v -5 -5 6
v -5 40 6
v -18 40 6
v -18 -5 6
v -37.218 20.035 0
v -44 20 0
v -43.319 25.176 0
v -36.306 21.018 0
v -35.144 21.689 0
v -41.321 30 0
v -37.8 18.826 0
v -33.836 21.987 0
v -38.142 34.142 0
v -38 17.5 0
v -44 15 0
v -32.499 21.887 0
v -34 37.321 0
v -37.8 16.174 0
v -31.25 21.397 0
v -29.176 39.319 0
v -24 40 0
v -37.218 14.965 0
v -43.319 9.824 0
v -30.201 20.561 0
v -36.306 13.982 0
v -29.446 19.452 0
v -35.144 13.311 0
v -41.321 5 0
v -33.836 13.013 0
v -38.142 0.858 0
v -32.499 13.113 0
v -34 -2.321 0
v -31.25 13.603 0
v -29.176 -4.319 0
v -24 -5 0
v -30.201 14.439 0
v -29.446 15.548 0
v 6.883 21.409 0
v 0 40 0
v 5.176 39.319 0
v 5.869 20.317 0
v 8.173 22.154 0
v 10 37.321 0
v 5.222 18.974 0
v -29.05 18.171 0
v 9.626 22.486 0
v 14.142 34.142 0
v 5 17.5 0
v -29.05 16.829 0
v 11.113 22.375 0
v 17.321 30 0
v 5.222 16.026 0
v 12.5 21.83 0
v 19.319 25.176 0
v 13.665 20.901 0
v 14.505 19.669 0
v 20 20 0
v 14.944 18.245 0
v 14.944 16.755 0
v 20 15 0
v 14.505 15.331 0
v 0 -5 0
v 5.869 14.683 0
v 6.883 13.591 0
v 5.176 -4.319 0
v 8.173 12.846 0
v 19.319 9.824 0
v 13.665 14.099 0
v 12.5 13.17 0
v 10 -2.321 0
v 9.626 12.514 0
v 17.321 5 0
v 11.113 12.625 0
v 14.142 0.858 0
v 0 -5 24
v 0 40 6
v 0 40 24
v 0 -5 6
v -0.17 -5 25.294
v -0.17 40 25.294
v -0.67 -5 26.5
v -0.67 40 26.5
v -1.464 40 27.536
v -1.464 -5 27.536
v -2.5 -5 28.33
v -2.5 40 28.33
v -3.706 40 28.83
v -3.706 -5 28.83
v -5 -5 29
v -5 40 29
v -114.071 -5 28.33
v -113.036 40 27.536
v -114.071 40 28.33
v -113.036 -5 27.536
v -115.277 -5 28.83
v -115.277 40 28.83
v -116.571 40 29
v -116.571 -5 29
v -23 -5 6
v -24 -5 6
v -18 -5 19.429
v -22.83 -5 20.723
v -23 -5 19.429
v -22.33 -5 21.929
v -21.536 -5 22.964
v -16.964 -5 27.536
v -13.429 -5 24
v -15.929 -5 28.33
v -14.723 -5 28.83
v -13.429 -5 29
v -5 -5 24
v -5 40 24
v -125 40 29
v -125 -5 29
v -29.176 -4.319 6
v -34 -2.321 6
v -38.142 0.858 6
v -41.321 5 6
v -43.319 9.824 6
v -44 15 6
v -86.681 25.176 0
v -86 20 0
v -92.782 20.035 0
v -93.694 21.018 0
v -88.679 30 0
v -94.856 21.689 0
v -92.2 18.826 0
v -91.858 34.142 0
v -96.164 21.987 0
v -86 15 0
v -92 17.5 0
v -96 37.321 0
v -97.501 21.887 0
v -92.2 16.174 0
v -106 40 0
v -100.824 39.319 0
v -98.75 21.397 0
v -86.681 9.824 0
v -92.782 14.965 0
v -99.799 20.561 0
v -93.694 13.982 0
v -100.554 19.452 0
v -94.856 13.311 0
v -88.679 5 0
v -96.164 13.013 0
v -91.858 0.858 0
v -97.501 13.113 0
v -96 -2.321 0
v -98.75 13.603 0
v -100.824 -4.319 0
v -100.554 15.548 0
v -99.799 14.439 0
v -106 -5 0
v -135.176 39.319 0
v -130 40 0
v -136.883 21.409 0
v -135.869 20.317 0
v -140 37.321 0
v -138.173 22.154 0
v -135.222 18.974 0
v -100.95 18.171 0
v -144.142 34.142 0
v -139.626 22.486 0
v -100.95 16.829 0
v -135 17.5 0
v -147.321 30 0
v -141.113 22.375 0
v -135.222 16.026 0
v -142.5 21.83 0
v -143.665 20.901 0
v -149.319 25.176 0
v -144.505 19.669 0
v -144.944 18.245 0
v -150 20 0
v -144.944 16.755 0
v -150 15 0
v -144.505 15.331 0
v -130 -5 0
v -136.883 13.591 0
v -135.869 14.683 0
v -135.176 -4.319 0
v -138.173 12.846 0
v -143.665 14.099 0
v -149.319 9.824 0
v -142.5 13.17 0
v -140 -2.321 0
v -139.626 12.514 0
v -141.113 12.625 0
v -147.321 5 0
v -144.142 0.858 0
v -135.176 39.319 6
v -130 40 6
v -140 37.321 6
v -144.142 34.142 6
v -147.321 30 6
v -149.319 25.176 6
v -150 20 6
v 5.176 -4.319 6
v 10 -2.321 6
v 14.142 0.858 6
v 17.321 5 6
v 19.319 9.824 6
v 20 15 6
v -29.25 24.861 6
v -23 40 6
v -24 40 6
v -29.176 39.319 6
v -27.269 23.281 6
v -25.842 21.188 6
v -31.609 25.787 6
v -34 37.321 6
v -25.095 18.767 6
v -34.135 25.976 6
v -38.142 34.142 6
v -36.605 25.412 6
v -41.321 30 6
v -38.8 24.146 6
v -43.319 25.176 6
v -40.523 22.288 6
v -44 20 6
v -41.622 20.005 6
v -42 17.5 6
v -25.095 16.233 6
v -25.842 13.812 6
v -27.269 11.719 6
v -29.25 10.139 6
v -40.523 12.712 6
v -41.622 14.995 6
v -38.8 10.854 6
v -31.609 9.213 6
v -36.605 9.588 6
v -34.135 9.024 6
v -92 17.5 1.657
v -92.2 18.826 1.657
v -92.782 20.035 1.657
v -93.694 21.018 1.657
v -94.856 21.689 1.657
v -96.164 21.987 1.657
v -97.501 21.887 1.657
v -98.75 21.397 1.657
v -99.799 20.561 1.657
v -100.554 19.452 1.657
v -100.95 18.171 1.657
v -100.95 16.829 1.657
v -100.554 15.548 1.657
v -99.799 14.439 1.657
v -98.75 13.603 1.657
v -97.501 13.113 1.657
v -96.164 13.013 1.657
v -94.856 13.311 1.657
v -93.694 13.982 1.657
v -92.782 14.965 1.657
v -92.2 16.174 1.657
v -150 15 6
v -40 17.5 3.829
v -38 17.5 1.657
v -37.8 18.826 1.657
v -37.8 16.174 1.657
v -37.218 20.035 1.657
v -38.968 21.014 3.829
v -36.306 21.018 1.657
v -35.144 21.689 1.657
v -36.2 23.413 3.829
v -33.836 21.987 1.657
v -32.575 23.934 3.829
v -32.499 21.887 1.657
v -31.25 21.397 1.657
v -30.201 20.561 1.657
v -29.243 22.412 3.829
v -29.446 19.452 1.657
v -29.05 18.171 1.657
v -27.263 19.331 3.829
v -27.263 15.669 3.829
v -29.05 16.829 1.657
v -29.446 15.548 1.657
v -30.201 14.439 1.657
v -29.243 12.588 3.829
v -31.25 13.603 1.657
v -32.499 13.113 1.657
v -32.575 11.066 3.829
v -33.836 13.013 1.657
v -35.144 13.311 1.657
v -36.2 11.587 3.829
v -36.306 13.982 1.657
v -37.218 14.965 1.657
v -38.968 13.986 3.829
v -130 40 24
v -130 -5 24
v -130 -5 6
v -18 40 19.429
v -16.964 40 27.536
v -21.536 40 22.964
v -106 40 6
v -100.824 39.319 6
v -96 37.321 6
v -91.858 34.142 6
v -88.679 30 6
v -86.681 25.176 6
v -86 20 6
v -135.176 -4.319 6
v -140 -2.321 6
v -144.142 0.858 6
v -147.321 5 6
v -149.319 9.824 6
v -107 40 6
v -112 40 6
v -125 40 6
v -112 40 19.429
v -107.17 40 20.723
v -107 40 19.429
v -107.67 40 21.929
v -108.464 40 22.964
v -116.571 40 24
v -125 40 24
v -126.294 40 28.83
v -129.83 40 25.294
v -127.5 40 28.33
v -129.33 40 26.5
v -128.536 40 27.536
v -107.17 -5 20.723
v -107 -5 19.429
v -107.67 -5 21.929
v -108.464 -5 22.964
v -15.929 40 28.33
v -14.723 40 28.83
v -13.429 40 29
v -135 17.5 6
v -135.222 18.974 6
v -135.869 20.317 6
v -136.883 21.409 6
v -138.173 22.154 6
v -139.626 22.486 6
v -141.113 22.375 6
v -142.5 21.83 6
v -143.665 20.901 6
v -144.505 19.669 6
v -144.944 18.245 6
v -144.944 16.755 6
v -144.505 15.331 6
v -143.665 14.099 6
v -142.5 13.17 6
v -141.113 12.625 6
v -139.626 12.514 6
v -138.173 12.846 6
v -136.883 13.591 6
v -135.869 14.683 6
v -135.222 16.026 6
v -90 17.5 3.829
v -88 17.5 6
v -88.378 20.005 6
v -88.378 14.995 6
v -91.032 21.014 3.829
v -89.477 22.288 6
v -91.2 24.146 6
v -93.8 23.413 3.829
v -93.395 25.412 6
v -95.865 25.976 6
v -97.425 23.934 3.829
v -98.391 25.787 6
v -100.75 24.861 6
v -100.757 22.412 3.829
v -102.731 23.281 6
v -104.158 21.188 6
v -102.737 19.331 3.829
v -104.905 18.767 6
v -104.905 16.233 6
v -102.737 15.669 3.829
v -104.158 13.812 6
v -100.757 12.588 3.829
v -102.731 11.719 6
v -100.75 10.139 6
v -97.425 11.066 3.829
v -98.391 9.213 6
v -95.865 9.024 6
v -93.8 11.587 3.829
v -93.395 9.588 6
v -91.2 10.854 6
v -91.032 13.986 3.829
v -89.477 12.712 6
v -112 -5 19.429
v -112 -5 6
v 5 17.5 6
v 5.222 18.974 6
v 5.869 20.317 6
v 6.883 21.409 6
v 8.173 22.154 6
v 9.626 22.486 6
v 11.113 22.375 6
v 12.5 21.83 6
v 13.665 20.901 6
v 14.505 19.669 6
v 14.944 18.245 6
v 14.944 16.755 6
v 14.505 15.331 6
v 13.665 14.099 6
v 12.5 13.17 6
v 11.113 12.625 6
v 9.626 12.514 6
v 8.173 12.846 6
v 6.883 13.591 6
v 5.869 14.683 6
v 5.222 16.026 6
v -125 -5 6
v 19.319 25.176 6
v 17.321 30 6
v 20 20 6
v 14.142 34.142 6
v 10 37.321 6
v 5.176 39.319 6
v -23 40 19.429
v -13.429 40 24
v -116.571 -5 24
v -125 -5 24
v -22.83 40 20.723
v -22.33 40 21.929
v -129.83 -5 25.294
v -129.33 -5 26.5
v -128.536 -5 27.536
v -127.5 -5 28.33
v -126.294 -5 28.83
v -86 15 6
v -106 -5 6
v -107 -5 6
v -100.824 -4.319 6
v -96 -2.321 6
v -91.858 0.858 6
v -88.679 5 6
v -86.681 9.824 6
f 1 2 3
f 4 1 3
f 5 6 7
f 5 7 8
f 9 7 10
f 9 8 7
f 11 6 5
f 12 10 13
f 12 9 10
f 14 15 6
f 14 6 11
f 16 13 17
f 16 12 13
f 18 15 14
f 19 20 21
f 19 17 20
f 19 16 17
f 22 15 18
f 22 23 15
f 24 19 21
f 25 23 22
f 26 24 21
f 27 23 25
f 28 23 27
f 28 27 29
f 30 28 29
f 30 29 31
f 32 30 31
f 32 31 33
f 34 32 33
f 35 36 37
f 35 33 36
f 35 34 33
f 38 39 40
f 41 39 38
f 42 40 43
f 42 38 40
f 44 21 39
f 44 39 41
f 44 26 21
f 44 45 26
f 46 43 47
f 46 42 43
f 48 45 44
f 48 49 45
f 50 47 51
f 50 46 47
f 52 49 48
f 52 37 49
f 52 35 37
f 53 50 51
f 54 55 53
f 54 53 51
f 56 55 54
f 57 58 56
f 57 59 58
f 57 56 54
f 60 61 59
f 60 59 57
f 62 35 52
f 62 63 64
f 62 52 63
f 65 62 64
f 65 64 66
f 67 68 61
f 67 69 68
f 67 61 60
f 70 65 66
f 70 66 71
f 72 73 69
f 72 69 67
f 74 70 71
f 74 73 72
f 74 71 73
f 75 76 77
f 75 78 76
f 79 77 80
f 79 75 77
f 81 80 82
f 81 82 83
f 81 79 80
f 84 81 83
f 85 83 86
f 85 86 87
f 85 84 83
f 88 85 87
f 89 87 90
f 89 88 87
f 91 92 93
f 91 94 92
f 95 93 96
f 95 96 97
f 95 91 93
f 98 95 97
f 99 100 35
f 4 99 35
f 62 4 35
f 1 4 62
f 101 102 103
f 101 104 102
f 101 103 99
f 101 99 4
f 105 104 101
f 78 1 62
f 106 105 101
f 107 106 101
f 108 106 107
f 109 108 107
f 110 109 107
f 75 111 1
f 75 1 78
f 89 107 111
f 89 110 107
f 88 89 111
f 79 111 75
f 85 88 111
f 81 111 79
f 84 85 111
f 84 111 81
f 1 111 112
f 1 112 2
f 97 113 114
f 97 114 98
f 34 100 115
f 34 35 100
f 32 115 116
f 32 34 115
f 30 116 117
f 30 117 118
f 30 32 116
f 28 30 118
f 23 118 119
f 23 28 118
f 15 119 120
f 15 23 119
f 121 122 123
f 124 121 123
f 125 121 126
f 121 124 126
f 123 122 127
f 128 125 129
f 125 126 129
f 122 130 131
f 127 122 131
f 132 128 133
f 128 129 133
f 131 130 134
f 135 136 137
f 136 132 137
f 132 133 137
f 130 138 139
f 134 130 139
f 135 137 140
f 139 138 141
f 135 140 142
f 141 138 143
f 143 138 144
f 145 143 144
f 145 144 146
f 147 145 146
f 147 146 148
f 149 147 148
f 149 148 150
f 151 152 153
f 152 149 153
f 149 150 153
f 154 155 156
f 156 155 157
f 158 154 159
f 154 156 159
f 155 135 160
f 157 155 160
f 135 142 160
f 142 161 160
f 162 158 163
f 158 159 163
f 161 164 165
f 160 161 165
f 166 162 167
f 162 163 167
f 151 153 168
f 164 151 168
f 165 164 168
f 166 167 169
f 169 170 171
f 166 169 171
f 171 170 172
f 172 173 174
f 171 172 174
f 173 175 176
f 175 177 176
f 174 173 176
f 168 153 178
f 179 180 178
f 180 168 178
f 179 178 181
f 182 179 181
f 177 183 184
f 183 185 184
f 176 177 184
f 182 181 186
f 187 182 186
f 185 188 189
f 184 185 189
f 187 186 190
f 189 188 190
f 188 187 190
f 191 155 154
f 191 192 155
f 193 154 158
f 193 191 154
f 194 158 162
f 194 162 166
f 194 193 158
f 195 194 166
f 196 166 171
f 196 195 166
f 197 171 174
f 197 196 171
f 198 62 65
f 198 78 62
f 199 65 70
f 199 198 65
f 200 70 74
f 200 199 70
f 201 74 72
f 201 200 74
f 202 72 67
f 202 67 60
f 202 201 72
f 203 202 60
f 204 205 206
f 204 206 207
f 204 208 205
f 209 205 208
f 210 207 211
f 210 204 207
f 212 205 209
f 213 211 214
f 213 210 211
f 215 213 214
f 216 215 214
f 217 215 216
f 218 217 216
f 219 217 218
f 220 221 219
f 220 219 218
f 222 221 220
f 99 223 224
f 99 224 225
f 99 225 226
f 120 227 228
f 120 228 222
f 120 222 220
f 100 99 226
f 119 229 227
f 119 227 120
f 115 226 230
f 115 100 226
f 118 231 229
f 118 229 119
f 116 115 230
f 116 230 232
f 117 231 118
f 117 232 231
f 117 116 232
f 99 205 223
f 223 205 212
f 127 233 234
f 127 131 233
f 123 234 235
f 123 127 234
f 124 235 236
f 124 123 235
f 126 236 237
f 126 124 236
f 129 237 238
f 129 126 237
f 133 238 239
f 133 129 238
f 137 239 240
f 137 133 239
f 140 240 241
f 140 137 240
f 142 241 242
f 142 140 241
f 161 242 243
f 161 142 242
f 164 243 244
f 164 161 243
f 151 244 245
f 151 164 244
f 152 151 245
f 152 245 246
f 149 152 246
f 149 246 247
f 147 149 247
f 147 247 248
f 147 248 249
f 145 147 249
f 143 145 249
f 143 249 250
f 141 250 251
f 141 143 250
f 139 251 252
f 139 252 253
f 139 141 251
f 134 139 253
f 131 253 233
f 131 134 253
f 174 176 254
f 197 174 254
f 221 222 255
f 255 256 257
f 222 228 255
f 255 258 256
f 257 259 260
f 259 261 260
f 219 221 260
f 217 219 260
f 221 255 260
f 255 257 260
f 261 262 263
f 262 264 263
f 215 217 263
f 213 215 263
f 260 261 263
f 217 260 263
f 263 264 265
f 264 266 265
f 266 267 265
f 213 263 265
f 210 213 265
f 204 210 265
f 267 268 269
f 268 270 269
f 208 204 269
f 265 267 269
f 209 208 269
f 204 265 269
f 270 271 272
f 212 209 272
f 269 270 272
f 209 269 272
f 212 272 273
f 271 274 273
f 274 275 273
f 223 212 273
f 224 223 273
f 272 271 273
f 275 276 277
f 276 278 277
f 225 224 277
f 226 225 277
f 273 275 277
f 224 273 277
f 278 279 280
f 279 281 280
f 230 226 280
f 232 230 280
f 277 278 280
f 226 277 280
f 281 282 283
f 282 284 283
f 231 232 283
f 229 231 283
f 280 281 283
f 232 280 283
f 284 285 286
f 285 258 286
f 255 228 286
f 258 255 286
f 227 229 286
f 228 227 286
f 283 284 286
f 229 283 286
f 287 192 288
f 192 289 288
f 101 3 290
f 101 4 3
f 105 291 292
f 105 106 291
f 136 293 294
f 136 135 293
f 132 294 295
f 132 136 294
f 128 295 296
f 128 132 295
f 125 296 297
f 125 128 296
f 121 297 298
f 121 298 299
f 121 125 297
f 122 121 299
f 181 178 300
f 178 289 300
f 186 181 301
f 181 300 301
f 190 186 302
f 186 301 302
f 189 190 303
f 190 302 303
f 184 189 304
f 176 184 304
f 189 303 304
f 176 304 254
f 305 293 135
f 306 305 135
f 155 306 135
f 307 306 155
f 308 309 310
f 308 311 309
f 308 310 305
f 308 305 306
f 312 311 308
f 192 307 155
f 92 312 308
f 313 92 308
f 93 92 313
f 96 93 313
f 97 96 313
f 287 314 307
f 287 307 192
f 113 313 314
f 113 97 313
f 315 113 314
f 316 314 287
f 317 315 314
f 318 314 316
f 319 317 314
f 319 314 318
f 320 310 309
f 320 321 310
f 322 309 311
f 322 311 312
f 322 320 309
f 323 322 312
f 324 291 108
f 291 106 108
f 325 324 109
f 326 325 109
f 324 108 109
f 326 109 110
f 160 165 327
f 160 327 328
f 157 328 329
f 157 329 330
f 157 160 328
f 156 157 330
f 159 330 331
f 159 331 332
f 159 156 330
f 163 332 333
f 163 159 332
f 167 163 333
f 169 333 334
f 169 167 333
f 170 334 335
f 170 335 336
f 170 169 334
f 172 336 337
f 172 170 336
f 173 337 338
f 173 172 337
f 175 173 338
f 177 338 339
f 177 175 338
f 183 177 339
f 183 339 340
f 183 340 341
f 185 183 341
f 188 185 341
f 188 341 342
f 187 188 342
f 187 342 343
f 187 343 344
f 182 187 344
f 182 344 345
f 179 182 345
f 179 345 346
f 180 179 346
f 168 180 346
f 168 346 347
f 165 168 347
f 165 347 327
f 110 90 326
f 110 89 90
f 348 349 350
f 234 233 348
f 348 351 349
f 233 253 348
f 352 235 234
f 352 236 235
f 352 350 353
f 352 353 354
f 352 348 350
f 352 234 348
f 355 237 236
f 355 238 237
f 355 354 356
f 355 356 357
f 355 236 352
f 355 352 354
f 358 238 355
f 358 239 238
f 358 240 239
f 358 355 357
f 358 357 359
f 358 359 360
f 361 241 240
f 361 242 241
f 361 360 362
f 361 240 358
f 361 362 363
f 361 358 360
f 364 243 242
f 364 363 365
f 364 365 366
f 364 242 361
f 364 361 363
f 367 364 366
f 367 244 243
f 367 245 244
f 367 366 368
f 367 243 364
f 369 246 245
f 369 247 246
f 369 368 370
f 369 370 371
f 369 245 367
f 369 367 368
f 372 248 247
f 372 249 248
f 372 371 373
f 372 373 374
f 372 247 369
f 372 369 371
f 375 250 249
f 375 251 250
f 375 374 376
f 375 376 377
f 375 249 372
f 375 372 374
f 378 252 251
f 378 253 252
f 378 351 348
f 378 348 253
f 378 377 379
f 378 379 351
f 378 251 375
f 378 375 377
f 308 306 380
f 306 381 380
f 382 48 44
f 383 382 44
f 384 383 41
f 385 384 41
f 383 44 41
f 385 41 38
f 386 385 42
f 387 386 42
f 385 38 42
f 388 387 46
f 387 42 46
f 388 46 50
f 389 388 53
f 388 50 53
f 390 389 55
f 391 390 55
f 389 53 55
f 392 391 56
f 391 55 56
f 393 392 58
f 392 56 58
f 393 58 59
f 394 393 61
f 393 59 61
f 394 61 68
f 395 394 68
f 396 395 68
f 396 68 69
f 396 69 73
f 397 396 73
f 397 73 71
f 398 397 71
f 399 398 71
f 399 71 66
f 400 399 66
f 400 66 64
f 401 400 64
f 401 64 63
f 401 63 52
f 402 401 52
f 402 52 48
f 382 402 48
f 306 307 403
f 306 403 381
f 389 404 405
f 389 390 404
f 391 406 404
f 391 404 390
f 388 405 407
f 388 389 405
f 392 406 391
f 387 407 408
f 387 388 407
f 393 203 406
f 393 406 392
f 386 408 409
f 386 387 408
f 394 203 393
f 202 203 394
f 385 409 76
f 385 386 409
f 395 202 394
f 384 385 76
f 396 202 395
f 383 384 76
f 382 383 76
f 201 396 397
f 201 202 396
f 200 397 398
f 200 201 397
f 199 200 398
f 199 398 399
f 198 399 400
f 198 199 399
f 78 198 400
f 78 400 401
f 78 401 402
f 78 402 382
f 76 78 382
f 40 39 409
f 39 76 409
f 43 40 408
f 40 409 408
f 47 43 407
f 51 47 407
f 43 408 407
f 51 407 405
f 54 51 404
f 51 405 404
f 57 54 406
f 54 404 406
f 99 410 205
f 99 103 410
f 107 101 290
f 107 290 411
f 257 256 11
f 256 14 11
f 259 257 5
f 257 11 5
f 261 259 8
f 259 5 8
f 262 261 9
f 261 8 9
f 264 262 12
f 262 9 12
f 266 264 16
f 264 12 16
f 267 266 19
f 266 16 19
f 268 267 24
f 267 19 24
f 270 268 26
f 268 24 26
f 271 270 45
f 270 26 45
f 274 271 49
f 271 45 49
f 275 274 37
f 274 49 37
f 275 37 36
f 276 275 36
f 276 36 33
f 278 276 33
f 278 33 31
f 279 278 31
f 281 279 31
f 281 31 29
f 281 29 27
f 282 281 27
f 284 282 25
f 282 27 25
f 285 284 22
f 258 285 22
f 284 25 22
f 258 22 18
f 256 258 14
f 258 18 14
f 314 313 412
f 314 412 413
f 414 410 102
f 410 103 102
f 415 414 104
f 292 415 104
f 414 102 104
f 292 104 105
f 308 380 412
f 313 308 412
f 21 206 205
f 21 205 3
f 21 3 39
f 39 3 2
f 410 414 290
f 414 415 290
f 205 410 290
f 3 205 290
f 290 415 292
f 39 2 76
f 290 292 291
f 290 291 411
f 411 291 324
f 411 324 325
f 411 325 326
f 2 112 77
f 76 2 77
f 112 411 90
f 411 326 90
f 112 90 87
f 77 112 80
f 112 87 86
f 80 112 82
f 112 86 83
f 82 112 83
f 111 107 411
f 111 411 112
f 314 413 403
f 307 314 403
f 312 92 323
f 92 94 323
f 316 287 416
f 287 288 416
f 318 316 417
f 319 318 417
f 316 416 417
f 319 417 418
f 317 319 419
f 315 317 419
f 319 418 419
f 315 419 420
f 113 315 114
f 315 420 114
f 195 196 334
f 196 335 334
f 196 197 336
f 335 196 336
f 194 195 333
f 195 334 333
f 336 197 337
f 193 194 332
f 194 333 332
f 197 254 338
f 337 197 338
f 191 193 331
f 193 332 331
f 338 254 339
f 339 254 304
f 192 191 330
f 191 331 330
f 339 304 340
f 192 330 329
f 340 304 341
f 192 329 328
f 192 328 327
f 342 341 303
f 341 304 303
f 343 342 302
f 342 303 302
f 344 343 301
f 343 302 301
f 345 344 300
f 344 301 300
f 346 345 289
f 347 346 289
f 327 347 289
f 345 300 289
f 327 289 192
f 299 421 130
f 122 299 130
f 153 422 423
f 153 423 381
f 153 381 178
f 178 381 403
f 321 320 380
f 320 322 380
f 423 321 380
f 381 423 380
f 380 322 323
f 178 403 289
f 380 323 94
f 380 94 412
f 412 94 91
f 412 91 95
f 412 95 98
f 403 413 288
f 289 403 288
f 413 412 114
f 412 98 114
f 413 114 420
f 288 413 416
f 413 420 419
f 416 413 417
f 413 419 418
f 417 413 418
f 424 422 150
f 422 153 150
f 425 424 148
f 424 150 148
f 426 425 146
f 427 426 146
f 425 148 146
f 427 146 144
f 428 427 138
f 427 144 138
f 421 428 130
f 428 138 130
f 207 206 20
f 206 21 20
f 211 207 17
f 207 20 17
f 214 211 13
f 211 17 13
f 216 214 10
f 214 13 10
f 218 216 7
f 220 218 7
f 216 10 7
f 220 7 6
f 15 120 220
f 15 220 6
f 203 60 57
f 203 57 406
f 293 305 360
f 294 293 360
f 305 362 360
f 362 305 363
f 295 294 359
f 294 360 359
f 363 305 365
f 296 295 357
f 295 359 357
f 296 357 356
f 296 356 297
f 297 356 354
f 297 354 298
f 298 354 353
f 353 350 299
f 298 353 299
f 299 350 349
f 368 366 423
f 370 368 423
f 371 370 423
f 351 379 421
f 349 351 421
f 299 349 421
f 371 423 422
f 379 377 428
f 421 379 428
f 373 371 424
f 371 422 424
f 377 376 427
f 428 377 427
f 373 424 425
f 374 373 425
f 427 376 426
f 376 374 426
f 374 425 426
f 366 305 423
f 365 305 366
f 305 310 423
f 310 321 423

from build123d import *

# Parameters (mm, degrees)
F6_DEPTH        = 5
F7_DEPTH        = 20
F8_DEPTH        = 40
F9_DEPTH        = 25
F10_R           = 5
F11_R           = 20
F12_D           = 9
F12_DEPTH       = 8
F12_CSINK_D     = 17
F12_CSINK_ANGLE = 85.294
F12_TIP         = 2.7038727856
F13_D           = 10
F13_DEPTH       = 8
F13_TIP         = 3.0043030951


# Not quite as in the source:
# - a feature names something its author has since deleted; it is built from what else it names


with BuildPart() as f6:
    # F3 (on Front) → F6 (new body)
    with BuildSketch(Plane.XZ):
        Polygon((-44, 0), (0, 0), (20, 0), (20, 6), (-44, 6), align=None)
    extrude(amount=F6_DEPTH)

    # F4 (on offset) → F7 (join)
    with BuildSketch(Plane.XZ.offset(-15)):
        Polygon((-5, 6), (0, 6), (0, 29), (-15.5, 29), (-23, 21.5), (-23, 6), (-18, 6), (-18, 19.4289321881), (-13.4289321881, 24), (-5, 24), align=None)
    extrude(amount=F7_DEPTH)

    # F3 (on Front) → F8 (join)
    with BuildSketch(Plane.XZ):
        Polygon((-44, 0), (0, 0), (20, 0), (20, 6), (-44, 6), align=None)
    extrude(amount=-F8_DEPTH)

    # F4 (on offset) → F9 (join)
    with BuildSketch(Plane.XZ.offset(-15)):
        Polygon((-5, 6), (0, 6), (0, 29), (-15.5, 29), (-23, 21.5), (-23, 6), (-18, 6), (-18, 19.4289321881), (-13.4289321881, 24), (-5, 24), align=None)
    extrude(amount=-F9_DEPTH)

    # F10
    f10_edges = [f6.edges().sort_by_distance(p)[0] for p in [
        (-15.5, 17.5, 29),
        (-23, 17.5, 21.5),
        (0, 17.5, 29),
    ]]
    fillet(f10_edges, radius=F10_R)

    # F11
    f11_edges = [f6.edges().sort_by_distance(p)[0] for p in [
        (20, -5, 3),
        (20, 40, 3),
        (-44, 40, 3),
        (-44, -5, 3),
    ]]
    fillet(f11_edges, radius=F11_R)

    # F12
    with Locations(Plane.XY.offset(6)):
        with Locations((-33.5, 17.5)):
            CounterSinkHole(F12_D / 2, F12_CSINK_D / 2, depth=F12_DEPTH, counter_sink_angle=F12_CSINK_ANGLE)
            with Locations((0, 0, -(F12_DEPTH + F12_TIP / 2))):  # 118° drill point
                Cone(0, F12_D / 2, F12_TIP, mode=Mode.SUBTRACT)

    # F13
    with Locations(Plane.XY.offset(6)):
        with Locations((10, 17.5)):
            Hole(F13_D / 2, depth=F13_DEPTH)
            with Locations((0, 0, -(F13_DEPTH + F13_TIP / 2))):  # 118° drill point
                Cone(0, F13_D / 2, F13_TIP, mode=Mode.SUBTRACT)


with BuildPart() as f15_1:
    # F15: instance of F6
    add(f6.part.mirror(Plane.YZ.offset(-65)))


solid = Compound([f6.part, f15_1.part])
